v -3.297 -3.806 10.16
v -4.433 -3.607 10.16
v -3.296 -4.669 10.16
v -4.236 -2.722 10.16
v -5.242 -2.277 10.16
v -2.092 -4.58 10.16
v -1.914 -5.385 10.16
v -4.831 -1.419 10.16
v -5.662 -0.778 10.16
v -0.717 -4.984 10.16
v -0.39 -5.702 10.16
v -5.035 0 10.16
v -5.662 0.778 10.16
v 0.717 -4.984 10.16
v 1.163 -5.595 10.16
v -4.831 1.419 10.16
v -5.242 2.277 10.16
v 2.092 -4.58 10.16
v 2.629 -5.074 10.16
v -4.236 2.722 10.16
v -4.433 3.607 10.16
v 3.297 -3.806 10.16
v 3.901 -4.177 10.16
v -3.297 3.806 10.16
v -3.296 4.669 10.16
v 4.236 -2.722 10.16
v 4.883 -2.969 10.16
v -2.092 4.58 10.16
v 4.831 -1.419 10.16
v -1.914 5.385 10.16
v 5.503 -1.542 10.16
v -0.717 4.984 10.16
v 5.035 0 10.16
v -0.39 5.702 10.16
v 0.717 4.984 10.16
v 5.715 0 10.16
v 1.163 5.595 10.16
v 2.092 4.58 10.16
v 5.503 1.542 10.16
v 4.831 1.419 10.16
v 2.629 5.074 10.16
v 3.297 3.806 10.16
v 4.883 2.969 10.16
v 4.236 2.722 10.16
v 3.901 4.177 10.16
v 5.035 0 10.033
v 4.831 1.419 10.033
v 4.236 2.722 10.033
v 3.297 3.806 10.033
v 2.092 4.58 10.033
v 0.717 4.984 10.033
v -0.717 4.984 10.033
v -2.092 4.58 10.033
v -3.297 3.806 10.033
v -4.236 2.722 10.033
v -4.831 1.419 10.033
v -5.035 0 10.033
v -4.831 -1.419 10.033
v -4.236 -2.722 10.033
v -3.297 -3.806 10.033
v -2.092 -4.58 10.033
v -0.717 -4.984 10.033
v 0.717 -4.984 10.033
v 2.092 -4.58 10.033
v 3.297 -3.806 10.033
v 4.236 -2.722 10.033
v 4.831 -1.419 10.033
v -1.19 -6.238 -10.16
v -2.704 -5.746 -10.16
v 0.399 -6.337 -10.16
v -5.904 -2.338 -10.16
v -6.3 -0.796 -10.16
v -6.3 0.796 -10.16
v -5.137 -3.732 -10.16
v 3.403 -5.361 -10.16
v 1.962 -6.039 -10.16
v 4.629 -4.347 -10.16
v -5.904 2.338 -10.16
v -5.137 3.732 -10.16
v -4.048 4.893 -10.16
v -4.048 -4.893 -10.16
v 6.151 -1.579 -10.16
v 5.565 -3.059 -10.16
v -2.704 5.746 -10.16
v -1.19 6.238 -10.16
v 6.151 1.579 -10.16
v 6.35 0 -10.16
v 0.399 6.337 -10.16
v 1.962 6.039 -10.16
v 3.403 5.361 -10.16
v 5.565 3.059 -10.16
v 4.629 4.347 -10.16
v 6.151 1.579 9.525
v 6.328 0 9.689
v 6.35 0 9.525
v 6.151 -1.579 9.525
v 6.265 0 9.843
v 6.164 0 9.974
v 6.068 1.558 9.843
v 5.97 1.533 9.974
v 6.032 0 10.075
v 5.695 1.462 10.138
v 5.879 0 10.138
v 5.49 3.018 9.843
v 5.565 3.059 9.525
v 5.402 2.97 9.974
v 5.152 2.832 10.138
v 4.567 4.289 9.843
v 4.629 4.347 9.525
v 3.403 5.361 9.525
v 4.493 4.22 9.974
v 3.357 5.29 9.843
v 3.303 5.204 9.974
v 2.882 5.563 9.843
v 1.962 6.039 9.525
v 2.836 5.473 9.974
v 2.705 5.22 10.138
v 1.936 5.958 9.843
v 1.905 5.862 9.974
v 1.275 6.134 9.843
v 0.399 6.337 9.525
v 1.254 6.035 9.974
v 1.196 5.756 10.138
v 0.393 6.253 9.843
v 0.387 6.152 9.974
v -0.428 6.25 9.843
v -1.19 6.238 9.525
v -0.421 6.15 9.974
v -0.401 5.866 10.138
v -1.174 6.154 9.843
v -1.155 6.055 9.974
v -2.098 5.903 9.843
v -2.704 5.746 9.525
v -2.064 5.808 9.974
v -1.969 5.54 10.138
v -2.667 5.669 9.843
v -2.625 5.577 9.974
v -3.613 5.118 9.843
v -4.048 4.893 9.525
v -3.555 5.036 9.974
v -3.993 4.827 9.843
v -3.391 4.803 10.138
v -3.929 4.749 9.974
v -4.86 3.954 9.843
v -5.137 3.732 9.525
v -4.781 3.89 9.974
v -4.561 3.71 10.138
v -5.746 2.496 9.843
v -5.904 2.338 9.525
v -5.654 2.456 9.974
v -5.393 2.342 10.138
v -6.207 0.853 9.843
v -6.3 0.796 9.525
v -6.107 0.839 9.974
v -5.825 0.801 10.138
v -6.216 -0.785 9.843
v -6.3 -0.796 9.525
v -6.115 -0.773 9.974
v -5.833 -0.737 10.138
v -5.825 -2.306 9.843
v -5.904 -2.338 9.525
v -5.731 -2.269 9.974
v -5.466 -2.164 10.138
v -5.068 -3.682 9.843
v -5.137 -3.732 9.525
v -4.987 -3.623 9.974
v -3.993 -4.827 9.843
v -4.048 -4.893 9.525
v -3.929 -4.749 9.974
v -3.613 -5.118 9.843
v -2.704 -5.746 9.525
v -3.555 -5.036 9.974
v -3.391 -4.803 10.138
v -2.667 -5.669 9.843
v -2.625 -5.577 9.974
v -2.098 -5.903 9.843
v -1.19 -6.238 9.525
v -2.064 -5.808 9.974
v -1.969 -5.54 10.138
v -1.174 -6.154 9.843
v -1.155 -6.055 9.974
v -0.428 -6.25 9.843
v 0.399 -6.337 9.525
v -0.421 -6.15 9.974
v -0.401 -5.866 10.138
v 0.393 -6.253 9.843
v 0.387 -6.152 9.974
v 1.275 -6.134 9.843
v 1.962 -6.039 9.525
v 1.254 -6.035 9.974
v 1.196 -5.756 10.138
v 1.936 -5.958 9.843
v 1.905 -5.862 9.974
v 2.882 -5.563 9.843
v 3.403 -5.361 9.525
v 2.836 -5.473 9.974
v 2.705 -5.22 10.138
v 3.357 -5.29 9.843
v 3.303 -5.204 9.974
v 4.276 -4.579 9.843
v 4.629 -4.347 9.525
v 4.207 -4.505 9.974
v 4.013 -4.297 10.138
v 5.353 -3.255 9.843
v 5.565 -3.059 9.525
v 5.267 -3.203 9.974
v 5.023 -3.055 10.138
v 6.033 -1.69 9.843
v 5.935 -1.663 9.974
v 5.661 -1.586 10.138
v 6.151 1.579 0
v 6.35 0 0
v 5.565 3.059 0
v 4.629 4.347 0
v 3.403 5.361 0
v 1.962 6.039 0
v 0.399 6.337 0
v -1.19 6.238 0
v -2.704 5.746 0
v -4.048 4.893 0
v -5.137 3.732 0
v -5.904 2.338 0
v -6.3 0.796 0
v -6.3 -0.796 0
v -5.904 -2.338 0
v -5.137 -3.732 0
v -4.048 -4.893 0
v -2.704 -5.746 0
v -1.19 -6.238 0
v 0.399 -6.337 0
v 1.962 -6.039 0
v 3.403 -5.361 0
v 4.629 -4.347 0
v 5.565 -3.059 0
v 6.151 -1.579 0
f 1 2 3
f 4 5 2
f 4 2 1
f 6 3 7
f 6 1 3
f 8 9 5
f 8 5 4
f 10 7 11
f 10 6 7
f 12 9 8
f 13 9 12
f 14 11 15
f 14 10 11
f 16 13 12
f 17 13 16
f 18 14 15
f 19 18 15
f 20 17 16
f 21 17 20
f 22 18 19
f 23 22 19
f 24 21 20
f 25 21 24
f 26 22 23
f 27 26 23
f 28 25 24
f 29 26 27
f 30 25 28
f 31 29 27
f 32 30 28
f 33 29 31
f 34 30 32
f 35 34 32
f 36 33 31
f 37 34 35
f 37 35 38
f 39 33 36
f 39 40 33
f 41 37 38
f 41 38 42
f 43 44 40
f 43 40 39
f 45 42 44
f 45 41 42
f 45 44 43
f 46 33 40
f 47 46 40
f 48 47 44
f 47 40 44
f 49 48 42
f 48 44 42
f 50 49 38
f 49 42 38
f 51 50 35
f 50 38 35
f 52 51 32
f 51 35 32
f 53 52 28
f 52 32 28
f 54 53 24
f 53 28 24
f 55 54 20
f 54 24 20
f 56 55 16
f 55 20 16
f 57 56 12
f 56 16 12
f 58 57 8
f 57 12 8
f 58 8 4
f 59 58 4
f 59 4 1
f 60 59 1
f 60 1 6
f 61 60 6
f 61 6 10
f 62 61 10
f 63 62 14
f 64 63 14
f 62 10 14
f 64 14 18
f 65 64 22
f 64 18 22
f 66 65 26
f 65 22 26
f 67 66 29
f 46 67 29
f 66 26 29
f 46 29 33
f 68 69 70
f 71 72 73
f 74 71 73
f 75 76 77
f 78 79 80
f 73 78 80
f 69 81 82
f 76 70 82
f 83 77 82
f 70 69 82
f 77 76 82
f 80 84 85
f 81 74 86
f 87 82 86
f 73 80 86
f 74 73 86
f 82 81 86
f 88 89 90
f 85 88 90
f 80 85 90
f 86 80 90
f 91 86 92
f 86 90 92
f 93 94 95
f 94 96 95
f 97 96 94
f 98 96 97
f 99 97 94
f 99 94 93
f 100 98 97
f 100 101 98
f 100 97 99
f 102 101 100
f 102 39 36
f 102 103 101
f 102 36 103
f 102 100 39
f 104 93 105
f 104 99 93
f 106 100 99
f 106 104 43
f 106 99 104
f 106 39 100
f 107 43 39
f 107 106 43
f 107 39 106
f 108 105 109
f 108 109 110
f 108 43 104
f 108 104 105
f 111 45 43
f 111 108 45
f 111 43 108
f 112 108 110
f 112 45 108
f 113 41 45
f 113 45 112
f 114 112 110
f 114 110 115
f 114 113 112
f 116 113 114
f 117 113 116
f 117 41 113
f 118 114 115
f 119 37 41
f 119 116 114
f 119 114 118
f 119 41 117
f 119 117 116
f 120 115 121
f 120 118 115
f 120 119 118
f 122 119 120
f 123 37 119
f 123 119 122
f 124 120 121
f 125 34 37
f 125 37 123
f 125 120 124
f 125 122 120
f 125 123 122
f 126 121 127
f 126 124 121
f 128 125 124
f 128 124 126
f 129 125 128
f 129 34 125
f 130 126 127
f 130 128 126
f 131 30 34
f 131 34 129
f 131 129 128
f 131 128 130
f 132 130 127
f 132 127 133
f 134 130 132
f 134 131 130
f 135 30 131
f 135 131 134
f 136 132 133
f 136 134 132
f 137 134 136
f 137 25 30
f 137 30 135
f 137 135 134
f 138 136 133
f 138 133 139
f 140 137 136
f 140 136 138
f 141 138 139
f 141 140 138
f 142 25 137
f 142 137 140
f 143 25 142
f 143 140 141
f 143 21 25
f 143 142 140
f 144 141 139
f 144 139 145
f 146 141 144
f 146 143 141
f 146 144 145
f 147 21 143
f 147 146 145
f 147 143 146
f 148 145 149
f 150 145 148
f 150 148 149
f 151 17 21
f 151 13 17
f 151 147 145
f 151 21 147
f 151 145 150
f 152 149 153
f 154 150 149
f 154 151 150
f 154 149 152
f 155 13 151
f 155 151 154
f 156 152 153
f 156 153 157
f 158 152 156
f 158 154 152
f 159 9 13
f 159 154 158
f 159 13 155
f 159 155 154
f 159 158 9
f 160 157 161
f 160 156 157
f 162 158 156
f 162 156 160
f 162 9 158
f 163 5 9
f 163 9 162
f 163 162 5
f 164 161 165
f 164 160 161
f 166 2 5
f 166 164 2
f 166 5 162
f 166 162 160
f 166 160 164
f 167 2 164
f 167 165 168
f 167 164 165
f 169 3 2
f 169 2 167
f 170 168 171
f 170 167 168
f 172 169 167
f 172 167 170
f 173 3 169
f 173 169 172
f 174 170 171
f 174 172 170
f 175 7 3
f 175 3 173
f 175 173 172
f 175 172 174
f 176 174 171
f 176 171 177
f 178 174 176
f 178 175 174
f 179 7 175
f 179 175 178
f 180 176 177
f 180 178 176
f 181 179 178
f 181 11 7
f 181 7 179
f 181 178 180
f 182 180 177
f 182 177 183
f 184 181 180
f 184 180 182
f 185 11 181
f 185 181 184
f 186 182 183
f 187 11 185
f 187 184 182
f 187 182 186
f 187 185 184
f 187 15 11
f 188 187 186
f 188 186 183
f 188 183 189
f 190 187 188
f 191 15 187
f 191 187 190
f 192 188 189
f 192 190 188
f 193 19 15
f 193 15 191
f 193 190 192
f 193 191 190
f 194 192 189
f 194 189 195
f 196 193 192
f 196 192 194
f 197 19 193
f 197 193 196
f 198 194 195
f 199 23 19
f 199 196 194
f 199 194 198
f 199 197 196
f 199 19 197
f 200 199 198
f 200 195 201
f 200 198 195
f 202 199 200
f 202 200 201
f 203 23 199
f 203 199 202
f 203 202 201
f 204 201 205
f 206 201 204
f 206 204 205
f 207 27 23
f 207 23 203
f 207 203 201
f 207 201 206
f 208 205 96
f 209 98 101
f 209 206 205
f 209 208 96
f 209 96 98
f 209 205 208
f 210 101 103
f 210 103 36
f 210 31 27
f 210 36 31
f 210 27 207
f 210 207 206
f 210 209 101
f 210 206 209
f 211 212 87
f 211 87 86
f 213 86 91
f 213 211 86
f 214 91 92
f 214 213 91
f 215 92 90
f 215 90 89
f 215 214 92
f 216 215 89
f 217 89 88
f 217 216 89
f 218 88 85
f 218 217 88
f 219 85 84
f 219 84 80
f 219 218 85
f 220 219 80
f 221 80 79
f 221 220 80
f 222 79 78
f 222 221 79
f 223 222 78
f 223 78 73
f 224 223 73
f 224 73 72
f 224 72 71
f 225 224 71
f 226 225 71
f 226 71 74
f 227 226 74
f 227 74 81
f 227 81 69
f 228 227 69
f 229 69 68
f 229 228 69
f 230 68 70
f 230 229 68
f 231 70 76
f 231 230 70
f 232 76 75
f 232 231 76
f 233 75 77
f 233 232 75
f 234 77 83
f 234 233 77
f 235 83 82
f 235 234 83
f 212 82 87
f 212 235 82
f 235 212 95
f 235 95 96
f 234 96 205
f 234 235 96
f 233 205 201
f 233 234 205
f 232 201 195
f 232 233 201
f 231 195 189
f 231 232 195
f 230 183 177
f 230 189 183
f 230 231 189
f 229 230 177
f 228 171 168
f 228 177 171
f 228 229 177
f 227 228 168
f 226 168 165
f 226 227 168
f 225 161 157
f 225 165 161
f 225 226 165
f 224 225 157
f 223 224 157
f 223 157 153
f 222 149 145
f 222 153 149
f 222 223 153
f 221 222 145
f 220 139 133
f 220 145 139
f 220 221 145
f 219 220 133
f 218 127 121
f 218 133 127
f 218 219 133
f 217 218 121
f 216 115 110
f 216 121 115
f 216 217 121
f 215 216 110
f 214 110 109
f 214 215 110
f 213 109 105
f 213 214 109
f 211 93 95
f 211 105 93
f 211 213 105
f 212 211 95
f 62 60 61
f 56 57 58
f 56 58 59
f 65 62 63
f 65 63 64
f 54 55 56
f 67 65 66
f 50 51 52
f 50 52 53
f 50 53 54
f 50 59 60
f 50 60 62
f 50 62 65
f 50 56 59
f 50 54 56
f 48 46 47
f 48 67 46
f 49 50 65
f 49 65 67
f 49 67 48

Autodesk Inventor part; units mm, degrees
ref_plane "YZ Plane" through (0, 0, 0) normal (1, 0, 0) x (0, 1, 0)
ref_plane "XZ Plane" through (0, 0, 0) normal (0, 1, 0) x (-1, 0, 0)
ref_plane "XY Plane" through (0, 0, 0) normal (0, 0, 1) x (1, 0, 0)
sketch "Sketch1" plane through (0, 0, 0) normal (0, 0, 1) x (1, 0, 0)
  circle A0 centre (0, 0) radius 6.35
  dimension "d0" = 12.7
extrude "Extrusion1" add sketch "Sketch1" along normal mid plane 20.32
fillet "Fillet1" radius 0.635 1 edges at (-6.35, 0, 10.16)
sketch "Sketch2" plane through (0, 0, 10.16) normal (0, 0, 1) x (1, 0, 0)
  circle A0 centre (0, 0) radius 5.715 projected
  circle A1 centre (0, 0) radius 5.0354
extrude "Extrusion2" cut sketch "Sketch2" against normal blind 0.127 contours A1
properties part number "Capacitor"
